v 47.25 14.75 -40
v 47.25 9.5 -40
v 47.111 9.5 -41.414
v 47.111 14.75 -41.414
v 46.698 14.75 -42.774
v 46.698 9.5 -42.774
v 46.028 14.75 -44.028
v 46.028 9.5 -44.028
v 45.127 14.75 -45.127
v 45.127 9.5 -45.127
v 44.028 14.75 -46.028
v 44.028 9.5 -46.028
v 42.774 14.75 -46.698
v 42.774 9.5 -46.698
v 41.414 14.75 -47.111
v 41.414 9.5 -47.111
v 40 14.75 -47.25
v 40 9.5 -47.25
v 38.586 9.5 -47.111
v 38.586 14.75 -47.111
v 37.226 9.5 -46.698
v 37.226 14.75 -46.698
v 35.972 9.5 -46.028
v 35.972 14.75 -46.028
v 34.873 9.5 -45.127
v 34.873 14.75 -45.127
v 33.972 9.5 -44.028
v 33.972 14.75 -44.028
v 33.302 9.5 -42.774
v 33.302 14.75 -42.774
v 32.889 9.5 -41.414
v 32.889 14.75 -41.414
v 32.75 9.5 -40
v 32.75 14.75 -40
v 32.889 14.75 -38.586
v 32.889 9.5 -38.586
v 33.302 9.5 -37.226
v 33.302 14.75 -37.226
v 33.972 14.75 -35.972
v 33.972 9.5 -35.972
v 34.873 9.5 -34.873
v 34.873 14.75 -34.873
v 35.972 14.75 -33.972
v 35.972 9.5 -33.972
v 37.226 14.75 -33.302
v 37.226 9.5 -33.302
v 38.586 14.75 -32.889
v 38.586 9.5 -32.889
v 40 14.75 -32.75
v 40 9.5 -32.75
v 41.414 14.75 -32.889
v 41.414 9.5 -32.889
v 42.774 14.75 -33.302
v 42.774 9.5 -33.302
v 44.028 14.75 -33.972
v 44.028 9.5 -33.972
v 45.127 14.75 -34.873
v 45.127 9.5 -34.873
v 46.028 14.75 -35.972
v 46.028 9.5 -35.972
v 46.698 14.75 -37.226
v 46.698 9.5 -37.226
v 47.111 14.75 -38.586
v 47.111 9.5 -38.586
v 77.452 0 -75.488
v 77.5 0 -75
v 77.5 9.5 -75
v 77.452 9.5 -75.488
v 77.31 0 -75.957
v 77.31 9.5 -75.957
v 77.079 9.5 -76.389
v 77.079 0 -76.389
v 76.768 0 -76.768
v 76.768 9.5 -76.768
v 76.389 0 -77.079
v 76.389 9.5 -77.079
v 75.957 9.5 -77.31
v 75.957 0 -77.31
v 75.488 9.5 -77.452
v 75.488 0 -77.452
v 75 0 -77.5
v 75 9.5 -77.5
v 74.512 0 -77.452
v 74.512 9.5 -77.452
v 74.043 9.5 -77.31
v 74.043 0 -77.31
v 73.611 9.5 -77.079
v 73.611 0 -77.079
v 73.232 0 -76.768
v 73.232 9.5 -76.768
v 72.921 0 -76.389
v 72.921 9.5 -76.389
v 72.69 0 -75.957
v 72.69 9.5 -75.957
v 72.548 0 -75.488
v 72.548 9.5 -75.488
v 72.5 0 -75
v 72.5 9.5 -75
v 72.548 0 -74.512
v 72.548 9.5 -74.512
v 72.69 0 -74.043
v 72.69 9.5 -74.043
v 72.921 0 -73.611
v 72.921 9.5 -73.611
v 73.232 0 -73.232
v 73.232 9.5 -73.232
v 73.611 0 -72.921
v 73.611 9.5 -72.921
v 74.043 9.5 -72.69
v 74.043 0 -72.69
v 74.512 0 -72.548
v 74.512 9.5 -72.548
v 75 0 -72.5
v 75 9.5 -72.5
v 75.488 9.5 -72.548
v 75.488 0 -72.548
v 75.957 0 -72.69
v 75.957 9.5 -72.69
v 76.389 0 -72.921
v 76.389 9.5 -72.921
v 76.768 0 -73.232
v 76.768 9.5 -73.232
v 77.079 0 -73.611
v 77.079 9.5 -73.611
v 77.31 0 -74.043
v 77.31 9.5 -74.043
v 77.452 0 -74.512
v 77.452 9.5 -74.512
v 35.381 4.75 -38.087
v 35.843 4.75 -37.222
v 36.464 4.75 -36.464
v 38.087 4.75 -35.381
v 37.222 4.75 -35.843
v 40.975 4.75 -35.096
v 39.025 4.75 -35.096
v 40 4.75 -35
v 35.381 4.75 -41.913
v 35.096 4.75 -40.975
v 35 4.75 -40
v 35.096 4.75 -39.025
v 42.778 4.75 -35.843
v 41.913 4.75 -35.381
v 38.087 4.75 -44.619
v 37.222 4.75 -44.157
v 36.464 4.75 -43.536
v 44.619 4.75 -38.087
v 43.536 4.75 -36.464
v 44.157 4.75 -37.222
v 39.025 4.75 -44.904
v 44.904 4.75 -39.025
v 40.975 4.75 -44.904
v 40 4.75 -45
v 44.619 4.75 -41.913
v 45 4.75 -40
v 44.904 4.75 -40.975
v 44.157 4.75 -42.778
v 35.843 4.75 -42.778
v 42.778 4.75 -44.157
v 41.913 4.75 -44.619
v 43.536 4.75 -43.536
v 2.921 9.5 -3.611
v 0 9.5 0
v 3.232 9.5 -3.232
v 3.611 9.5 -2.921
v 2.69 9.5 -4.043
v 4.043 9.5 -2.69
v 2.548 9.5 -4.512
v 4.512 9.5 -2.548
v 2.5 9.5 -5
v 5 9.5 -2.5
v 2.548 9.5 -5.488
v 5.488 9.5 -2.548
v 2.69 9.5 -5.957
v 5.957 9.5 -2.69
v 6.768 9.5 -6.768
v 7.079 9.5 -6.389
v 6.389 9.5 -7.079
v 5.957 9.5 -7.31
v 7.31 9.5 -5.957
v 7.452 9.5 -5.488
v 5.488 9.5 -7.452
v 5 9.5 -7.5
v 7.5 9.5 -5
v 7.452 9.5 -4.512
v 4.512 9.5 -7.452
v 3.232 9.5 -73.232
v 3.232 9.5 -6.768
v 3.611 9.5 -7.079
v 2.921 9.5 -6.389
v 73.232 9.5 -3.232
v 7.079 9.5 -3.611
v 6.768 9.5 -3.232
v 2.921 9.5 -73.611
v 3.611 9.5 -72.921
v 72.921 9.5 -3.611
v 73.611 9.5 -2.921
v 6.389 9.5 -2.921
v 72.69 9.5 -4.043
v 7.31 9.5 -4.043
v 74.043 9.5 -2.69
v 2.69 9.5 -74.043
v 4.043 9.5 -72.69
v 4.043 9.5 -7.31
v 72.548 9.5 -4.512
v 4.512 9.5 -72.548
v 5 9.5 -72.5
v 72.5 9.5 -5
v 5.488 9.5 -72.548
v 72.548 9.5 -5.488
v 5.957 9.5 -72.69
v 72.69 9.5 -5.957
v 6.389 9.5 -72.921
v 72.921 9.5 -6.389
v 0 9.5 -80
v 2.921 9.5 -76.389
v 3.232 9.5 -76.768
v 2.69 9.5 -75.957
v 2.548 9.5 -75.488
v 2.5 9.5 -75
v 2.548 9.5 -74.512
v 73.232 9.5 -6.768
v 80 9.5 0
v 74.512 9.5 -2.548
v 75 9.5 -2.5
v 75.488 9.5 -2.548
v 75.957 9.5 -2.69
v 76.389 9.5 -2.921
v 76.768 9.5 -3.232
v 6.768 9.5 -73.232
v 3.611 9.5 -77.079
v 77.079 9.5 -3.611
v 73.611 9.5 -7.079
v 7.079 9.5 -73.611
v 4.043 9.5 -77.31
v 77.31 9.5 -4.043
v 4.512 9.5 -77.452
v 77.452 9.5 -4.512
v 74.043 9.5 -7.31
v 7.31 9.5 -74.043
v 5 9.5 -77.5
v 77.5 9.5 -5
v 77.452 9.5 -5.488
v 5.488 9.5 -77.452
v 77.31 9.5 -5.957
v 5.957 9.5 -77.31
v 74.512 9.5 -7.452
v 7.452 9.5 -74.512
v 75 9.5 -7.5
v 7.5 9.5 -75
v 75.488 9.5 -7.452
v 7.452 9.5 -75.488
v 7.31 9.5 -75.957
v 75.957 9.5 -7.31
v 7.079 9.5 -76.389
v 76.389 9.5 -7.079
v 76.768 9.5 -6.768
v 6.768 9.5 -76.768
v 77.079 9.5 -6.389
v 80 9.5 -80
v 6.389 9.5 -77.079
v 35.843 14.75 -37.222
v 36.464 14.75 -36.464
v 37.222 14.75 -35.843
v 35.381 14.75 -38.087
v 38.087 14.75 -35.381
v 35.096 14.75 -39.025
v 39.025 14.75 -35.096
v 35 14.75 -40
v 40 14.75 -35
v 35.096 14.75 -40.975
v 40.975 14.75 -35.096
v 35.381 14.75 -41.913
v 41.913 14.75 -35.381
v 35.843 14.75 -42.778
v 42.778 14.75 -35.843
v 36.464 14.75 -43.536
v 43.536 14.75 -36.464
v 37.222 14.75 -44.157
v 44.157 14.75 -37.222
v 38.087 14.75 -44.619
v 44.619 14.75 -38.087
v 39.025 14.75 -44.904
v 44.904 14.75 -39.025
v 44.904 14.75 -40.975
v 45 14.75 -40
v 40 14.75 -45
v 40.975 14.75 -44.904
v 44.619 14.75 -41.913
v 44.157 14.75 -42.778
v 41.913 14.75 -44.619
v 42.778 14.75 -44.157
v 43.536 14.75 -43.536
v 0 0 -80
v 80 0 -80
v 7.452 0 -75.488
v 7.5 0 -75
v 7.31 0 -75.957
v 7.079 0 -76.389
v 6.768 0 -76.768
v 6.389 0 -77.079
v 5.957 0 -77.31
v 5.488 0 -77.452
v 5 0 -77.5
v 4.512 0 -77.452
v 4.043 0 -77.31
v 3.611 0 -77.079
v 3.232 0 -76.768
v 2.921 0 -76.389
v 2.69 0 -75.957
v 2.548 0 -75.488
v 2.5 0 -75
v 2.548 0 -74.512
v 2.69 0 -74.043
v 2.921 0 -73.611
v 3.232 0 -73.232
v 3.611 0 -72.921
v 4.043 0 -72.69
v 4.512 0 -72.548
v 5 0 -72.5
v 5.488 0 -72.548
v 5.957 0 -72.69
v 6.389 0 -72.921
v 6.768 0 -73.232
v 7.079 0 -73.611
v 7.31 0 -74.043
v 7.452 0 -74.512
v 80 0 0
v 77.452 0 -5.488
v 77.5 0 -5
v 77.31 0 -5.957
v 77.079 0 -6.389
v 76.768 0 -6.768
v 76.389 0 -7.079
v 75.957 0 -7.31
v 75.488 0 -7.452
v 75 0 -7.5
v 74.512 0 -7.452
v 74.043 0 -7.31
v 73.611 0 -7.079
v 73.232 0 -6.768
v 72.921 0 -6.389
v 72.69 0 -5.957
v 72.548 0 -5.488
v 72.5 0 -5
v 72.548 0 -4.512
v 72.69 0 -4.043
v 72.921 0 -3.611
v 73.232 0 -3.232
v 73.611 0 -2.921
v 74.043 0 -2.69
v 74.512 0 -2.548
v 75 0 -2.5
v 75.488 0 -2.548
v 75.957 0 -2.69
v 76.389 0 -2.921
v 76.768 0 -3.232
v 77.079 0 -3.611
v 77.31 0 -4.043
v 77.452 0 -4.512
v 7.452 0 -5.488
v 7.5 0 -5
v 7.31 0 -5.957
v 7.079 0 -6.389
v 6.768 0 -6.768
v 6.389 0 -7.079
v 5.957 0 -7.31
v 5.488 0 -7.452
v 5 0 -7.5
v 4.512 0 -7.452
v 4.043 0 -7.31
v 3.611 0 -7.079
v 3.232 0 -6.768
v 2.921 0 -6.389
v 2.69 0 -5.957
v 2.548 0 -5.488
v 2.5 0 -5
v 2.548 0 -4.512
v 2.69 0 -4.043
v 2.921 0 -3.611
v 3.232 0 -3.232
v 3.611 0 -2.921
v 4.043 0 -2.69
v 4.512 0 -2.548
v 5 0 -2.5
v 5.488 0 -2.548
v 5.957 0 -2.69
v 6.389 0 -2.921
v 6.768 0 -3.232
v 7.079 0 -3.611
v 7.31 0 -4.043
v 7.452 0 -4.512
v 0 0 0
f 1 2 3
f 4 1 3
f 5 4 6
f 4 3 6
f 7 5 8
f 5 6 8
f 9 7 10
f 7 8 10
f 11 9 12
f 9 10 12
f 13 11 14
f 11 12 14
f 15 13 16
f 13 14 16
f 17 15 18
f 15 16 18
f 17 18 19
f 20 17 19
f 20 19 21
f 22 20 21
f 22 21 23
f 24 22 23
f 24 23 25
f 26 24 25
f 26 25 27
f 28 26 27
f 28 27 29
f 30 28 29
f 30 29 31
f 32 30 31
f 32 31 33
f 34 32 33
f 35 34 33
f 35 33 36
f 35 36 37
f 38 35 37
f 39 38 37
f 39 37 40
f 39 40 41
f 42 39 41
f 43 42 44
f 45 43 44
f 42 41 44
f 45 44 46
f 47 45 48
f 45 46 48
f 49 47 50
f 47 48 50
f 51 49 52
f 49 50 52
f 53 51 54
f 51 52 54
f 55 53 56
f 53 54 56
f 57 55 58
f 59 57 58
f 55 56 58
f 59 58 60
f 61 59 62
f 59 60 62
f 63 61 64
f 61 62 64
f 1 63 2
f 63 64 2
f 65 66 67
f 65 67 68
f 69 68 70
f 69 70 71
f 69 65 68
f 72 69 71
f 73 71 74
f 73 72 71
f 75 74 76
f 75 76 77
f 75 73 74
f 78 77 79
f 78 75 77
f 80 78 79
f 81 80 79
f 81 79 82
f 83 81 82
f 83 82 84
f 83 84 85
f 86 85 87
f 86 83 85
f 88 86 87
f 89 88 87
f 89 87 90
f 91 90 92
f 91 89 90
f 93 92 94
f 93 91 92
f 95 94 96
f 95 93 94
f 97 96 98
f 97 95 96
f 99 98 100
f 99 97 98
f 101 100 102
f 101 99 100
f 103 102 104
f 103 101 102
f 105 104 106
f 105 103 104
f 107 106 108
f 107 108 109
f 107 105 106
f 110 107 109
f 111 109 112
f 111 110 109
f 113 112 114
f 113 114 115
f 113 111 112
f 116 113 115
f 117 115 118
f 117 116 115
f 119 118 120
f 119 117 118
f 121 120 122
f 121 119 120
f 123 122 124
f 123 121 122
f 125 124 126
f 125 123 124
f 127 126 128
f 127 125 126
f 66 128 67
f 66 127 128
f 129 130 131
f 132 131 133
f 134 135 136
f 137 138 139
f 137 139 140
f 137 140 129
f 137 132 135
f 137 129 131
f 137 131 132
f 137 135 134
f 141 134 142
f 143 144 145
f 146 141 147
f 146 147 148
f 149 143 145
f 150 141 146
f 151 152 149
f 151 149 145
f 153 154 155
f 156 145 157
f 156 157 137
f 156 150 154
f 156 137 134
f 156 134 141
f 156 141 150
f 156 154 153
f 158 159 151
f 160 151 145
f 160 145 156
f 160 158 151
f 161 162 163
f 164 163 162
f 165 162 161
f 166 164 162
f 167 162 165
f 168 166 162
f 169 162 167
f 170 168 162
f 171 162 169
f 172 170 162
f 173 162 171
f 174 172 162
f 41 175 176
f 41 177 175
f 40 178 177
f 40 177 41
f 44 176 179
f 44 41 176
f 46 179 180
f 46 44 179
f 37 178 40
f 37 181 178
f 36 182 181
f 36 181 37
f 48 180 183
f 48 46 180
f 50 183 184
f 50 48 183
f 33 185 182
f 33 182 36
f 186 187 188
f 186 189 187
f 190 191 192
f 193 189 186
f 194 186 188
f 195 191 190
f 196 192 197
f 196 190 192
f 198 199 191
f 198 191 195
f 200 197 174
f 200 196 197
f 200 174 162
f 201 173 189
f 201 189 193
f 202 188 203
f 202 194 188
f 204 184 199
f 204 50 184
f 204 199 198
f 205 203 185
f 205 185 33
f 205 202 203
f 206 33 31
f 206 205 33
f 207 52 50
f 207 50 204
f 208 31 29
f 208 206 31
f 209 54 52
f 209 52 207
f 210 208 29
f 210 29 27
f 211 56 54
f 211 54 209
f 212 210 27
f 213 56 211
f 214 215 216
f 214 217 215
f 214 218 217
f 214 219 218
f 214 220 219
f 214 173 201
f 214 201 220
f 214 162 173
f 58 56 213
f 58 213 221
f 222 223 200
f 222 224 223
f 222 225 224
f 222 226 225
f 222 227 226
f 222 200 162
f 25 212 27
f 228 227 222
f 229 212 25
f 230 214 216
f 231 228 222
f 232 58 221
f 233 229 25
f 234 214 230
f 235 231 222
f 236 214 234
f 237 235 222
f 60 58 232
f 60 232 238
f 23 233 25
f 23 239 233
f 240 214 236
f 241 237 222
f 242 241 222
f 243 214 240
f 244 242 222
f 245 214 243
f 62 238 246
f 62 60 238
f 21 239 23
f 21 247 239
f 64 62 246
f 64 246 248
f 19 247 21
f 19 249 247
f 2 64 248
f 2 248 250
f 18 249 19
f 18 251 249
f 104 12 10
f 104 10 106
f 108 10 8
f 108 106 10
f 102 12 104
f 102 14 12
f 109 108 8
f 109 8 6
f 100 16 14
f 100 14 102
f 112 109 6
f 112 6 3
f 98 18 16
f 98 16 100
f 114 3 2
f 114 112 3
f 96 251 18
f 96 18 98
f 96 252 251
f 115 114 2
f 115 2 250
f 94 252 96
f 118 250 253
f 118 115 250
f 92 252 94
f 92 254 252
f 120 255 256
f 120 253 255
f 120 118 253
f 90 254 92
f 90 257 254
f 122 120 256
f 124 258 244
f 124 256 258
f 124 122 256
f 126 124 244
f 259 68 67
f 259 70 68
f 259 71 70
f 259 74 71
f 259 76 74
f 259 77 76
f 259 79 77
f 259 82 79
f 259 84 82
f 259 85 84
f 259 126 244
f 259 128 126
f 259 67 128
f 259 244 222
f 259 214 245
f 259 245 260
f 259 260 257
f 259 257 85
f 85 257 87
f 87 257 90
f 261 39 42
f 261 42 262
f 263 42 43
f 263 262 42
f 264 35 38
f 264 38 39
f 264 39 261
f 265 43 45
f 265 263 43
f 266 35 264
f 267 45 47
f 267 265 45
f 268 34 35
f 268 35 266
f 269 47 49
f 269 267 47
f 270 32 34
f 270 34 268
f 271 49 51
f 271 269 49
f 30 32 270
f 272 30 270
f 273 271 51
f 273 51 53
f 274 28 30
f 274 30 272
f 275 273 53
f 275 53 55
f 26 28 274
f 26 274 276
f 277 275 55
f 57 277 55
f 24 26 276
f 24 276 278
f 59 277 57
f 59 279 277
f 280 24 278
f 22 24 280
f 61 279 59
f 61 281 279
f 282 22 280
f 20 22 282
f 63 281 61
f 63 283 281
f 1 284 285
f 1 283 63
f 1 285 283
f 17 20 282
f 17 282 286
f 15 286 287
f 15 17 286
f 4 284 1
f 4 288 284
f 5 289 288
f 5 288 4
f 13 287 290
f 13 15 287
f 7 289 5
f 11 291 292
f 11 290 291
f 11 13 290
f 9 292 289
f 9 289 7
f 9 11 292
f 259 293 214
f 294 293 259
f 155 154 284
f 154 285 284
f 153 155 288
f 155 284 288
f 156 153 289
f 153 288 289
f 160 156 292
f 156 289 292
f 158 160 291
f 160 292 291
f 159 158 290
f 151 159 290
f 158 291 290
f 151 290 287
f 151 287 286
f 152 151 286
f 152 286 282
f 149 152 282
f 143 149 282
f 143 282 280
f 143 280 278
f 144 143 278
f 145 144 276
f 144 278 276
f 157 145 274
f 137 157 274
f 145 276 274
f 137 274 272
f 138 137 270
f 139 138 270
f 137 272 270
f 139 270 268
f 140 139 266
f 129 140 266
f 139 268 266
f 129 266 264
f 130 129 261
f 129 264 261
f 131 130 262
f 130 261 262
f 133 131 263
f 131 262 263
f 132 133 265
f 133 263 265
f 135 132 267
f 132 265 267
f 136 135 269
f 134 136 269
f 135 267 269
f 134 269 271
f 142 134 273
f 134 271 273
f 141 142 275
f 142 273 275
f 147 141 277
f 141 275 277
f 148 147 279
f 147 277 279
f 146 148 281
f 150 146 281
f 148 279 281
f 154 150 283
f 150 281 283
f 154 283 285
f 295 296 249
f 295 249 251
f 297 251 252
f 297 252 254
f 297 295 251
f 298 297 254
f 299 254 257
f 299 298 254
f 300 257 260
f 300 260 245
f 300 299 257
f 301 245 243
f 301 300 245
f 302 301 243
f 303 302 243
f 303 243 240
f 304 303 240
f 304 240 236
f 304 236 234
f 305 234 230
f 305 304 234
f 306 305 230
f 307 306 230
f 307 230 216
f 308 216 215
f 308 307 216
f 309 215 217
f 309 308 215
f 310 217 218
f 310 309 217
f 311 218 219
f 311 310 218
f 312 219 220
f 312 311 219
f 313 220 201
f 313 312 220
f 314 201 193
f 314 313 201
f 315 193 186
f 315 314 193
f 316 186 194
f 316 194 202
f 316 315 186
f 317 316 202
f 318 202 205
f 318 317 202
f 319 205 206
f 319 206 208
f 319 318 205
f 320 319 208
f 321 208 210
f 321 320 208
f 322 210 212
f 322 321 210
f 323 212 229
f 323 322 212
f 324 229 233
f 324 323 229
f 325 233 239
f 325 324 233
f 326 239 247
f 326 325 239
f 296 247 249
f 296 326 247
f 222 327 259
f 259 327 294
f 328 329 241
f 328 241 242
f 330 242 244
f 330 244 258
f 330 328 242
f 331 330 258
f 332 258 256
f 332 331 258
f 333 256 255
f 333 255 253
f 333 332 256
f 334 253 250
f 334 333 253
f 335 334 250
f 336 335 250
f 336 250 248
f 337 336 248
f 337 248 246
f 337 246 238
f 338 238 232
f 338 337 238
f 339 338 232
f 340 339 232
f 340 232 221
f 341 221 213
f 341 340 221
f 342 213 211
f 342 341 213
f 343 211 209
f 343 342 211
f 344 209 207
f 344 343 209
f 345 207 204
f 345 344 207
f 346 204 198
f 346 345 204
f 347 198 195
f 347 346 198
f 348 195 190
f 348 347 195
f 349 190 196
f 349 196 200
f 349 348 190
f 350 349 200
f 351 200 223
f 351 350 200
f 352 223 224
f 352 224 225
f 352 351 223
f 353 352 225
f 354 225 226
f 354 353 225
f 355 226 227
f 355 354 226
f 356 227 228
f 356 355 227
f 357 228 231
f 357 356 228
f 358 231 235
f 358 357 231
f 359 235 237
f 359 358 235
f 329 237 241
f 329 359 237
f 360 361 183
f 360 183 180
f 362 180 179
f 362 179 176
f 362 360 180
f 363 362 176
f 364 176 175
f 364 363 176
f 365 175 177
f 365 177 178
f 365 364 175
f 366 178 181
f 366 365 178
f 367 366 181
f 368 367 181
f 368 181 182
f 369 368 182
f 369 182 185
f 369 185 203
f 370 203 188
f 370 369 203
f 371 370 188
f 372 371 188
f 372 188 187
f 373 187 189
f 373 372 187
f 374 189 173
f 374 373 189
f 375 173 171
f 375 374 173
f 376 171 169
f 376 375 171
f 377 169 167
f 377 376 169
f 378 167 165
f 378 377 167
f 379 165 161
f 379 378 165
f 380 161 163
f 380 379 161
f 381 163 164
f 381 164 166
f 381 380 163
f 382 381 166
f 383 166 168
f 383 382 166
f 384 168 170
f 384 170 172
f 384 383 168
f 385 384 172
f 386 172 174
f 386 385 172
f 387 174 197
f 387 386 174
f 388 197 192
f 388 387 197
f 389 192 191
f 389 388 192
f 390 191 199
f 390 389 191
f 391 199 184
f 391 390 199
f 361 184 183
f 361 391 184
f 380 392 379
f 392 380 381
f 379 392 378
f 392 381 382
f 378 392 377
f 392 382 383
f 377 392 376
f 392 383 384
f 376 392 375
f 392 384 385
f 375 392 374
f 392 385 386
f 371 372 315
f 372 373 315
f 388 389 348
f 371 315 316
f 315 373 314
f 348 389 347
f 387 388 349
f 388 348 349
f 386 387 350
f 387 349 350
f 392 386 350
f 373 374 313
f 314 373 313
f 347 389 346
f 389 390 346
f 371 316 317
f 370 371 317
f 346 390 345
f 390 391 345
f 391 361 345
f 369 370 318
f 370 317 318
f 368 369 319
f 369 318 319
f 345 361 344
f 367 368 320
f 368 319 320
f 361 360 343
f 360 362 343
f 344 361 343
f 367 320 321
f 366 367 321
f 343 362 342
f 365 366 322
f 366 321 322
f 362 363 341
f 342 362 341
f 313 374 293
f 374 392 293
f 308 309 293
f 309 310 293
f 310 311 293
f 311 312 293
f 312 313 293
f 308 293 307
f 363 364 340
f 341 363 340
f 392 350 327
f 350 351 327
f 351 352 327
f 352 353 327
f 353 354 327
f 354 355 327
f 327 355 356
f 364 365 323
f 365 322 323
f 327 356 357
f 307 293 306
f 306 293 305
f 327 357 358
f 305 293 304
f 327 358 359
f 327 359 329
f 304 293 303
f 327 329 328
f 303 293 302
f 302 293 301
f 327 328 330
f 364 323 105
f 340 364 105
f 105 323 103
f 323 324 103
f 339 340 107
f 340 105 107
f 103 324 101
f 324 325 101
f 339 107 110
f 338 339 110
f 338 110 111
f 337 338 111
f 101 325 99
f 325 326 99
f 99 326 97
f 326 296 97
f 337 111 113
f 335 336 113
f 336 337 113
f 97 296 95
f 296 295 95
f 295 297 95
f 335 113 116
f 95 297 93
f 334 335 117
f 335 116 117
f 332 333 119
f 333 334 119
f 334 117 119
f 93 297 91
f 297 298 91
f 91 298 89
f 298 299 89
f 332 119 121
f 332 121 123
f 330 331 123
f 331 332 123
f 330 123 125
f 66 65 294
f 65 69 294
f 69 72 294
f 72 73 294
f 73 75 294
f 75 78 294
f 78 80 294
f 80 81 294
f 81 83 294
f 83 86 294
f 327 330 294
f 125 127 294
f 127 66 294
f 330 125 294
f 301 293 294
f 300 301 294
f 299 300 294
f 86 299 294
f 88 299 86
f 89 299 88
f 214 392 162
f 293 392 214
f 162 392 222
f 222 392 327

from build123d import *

# Parameters (mm, degrees)
SKETCH1_W           = 80
SKETCH1_H           = 80
SKETCH1_R           = 2.5
BOSS_EXTRUDE1_DEPTH = 9.5
SKETCH3_R           = 5
CUT_EXTRUDE1_DEPTH  = 4.75
SKETCH10_R          = 7.25
SKETCH10_R_2        = 5
BOSS_EXTRUDE3_DEPTH = 10


with BuildPart() as part:
    # Sketch1 → Boss-Extrude1 (new body)
    with BuildSketch(Plane(origin=(0, 0, 0), x_dir=(1, 0, 0), z_dir=(0, 1, 0))):
        with Locations((40, 40)):
            Rectangle(SKETCH1_W, SKETCH1_H)
        with Locations((5, 75)):
            Circle(SKETCH1_R, mode=Mode.SUBTRACT)
        with Locations((75, 75)):
            Circle(SKETCH1_R, mode=Mode.SUBTRACT)
        with Locations((75, 5)):
            Circle(SKETCH1_R, mode=Mode.SUBTRACT)
        with Locations((5, 5)):
            Circle(SKETCH1_R, mode=Mode.SUBTRACT)
    extrude(amount=BOSS_EXTRUDE1_DEPTH)

    # Sketch3 → Cut-Extrude1 (cut, symmetric)
    with BuildSketch(Plane(origin=(0, 9.5, 0), x_dir=(1, 0, 0), z_dir=(0, 1, 0))):
        with Locations((40, 40)):
            Circle(SKETCH3_R)
    extrude(amount=CUT_EXTRUDE1_DEPTH, both=True, mode=Mode.SUBTRACT)

    # Sketch10 → Boss-Extrude3 (add)
    with BuildSketch(Plane(origin=(0, 4.75, 0), x_dir=(1, 0, 0), z_dir=(0, 1, 0))):
        with Locations((40, 40)):
            Circle(SKETCH10_R)
        with Locations((40, 40)):
            Circle(SKETCH10_R_2, mode=Mode.SUBTRACT)
    extrude(amount=BOSS_EXTRUDE3_DEPTH)


solid = part.part
